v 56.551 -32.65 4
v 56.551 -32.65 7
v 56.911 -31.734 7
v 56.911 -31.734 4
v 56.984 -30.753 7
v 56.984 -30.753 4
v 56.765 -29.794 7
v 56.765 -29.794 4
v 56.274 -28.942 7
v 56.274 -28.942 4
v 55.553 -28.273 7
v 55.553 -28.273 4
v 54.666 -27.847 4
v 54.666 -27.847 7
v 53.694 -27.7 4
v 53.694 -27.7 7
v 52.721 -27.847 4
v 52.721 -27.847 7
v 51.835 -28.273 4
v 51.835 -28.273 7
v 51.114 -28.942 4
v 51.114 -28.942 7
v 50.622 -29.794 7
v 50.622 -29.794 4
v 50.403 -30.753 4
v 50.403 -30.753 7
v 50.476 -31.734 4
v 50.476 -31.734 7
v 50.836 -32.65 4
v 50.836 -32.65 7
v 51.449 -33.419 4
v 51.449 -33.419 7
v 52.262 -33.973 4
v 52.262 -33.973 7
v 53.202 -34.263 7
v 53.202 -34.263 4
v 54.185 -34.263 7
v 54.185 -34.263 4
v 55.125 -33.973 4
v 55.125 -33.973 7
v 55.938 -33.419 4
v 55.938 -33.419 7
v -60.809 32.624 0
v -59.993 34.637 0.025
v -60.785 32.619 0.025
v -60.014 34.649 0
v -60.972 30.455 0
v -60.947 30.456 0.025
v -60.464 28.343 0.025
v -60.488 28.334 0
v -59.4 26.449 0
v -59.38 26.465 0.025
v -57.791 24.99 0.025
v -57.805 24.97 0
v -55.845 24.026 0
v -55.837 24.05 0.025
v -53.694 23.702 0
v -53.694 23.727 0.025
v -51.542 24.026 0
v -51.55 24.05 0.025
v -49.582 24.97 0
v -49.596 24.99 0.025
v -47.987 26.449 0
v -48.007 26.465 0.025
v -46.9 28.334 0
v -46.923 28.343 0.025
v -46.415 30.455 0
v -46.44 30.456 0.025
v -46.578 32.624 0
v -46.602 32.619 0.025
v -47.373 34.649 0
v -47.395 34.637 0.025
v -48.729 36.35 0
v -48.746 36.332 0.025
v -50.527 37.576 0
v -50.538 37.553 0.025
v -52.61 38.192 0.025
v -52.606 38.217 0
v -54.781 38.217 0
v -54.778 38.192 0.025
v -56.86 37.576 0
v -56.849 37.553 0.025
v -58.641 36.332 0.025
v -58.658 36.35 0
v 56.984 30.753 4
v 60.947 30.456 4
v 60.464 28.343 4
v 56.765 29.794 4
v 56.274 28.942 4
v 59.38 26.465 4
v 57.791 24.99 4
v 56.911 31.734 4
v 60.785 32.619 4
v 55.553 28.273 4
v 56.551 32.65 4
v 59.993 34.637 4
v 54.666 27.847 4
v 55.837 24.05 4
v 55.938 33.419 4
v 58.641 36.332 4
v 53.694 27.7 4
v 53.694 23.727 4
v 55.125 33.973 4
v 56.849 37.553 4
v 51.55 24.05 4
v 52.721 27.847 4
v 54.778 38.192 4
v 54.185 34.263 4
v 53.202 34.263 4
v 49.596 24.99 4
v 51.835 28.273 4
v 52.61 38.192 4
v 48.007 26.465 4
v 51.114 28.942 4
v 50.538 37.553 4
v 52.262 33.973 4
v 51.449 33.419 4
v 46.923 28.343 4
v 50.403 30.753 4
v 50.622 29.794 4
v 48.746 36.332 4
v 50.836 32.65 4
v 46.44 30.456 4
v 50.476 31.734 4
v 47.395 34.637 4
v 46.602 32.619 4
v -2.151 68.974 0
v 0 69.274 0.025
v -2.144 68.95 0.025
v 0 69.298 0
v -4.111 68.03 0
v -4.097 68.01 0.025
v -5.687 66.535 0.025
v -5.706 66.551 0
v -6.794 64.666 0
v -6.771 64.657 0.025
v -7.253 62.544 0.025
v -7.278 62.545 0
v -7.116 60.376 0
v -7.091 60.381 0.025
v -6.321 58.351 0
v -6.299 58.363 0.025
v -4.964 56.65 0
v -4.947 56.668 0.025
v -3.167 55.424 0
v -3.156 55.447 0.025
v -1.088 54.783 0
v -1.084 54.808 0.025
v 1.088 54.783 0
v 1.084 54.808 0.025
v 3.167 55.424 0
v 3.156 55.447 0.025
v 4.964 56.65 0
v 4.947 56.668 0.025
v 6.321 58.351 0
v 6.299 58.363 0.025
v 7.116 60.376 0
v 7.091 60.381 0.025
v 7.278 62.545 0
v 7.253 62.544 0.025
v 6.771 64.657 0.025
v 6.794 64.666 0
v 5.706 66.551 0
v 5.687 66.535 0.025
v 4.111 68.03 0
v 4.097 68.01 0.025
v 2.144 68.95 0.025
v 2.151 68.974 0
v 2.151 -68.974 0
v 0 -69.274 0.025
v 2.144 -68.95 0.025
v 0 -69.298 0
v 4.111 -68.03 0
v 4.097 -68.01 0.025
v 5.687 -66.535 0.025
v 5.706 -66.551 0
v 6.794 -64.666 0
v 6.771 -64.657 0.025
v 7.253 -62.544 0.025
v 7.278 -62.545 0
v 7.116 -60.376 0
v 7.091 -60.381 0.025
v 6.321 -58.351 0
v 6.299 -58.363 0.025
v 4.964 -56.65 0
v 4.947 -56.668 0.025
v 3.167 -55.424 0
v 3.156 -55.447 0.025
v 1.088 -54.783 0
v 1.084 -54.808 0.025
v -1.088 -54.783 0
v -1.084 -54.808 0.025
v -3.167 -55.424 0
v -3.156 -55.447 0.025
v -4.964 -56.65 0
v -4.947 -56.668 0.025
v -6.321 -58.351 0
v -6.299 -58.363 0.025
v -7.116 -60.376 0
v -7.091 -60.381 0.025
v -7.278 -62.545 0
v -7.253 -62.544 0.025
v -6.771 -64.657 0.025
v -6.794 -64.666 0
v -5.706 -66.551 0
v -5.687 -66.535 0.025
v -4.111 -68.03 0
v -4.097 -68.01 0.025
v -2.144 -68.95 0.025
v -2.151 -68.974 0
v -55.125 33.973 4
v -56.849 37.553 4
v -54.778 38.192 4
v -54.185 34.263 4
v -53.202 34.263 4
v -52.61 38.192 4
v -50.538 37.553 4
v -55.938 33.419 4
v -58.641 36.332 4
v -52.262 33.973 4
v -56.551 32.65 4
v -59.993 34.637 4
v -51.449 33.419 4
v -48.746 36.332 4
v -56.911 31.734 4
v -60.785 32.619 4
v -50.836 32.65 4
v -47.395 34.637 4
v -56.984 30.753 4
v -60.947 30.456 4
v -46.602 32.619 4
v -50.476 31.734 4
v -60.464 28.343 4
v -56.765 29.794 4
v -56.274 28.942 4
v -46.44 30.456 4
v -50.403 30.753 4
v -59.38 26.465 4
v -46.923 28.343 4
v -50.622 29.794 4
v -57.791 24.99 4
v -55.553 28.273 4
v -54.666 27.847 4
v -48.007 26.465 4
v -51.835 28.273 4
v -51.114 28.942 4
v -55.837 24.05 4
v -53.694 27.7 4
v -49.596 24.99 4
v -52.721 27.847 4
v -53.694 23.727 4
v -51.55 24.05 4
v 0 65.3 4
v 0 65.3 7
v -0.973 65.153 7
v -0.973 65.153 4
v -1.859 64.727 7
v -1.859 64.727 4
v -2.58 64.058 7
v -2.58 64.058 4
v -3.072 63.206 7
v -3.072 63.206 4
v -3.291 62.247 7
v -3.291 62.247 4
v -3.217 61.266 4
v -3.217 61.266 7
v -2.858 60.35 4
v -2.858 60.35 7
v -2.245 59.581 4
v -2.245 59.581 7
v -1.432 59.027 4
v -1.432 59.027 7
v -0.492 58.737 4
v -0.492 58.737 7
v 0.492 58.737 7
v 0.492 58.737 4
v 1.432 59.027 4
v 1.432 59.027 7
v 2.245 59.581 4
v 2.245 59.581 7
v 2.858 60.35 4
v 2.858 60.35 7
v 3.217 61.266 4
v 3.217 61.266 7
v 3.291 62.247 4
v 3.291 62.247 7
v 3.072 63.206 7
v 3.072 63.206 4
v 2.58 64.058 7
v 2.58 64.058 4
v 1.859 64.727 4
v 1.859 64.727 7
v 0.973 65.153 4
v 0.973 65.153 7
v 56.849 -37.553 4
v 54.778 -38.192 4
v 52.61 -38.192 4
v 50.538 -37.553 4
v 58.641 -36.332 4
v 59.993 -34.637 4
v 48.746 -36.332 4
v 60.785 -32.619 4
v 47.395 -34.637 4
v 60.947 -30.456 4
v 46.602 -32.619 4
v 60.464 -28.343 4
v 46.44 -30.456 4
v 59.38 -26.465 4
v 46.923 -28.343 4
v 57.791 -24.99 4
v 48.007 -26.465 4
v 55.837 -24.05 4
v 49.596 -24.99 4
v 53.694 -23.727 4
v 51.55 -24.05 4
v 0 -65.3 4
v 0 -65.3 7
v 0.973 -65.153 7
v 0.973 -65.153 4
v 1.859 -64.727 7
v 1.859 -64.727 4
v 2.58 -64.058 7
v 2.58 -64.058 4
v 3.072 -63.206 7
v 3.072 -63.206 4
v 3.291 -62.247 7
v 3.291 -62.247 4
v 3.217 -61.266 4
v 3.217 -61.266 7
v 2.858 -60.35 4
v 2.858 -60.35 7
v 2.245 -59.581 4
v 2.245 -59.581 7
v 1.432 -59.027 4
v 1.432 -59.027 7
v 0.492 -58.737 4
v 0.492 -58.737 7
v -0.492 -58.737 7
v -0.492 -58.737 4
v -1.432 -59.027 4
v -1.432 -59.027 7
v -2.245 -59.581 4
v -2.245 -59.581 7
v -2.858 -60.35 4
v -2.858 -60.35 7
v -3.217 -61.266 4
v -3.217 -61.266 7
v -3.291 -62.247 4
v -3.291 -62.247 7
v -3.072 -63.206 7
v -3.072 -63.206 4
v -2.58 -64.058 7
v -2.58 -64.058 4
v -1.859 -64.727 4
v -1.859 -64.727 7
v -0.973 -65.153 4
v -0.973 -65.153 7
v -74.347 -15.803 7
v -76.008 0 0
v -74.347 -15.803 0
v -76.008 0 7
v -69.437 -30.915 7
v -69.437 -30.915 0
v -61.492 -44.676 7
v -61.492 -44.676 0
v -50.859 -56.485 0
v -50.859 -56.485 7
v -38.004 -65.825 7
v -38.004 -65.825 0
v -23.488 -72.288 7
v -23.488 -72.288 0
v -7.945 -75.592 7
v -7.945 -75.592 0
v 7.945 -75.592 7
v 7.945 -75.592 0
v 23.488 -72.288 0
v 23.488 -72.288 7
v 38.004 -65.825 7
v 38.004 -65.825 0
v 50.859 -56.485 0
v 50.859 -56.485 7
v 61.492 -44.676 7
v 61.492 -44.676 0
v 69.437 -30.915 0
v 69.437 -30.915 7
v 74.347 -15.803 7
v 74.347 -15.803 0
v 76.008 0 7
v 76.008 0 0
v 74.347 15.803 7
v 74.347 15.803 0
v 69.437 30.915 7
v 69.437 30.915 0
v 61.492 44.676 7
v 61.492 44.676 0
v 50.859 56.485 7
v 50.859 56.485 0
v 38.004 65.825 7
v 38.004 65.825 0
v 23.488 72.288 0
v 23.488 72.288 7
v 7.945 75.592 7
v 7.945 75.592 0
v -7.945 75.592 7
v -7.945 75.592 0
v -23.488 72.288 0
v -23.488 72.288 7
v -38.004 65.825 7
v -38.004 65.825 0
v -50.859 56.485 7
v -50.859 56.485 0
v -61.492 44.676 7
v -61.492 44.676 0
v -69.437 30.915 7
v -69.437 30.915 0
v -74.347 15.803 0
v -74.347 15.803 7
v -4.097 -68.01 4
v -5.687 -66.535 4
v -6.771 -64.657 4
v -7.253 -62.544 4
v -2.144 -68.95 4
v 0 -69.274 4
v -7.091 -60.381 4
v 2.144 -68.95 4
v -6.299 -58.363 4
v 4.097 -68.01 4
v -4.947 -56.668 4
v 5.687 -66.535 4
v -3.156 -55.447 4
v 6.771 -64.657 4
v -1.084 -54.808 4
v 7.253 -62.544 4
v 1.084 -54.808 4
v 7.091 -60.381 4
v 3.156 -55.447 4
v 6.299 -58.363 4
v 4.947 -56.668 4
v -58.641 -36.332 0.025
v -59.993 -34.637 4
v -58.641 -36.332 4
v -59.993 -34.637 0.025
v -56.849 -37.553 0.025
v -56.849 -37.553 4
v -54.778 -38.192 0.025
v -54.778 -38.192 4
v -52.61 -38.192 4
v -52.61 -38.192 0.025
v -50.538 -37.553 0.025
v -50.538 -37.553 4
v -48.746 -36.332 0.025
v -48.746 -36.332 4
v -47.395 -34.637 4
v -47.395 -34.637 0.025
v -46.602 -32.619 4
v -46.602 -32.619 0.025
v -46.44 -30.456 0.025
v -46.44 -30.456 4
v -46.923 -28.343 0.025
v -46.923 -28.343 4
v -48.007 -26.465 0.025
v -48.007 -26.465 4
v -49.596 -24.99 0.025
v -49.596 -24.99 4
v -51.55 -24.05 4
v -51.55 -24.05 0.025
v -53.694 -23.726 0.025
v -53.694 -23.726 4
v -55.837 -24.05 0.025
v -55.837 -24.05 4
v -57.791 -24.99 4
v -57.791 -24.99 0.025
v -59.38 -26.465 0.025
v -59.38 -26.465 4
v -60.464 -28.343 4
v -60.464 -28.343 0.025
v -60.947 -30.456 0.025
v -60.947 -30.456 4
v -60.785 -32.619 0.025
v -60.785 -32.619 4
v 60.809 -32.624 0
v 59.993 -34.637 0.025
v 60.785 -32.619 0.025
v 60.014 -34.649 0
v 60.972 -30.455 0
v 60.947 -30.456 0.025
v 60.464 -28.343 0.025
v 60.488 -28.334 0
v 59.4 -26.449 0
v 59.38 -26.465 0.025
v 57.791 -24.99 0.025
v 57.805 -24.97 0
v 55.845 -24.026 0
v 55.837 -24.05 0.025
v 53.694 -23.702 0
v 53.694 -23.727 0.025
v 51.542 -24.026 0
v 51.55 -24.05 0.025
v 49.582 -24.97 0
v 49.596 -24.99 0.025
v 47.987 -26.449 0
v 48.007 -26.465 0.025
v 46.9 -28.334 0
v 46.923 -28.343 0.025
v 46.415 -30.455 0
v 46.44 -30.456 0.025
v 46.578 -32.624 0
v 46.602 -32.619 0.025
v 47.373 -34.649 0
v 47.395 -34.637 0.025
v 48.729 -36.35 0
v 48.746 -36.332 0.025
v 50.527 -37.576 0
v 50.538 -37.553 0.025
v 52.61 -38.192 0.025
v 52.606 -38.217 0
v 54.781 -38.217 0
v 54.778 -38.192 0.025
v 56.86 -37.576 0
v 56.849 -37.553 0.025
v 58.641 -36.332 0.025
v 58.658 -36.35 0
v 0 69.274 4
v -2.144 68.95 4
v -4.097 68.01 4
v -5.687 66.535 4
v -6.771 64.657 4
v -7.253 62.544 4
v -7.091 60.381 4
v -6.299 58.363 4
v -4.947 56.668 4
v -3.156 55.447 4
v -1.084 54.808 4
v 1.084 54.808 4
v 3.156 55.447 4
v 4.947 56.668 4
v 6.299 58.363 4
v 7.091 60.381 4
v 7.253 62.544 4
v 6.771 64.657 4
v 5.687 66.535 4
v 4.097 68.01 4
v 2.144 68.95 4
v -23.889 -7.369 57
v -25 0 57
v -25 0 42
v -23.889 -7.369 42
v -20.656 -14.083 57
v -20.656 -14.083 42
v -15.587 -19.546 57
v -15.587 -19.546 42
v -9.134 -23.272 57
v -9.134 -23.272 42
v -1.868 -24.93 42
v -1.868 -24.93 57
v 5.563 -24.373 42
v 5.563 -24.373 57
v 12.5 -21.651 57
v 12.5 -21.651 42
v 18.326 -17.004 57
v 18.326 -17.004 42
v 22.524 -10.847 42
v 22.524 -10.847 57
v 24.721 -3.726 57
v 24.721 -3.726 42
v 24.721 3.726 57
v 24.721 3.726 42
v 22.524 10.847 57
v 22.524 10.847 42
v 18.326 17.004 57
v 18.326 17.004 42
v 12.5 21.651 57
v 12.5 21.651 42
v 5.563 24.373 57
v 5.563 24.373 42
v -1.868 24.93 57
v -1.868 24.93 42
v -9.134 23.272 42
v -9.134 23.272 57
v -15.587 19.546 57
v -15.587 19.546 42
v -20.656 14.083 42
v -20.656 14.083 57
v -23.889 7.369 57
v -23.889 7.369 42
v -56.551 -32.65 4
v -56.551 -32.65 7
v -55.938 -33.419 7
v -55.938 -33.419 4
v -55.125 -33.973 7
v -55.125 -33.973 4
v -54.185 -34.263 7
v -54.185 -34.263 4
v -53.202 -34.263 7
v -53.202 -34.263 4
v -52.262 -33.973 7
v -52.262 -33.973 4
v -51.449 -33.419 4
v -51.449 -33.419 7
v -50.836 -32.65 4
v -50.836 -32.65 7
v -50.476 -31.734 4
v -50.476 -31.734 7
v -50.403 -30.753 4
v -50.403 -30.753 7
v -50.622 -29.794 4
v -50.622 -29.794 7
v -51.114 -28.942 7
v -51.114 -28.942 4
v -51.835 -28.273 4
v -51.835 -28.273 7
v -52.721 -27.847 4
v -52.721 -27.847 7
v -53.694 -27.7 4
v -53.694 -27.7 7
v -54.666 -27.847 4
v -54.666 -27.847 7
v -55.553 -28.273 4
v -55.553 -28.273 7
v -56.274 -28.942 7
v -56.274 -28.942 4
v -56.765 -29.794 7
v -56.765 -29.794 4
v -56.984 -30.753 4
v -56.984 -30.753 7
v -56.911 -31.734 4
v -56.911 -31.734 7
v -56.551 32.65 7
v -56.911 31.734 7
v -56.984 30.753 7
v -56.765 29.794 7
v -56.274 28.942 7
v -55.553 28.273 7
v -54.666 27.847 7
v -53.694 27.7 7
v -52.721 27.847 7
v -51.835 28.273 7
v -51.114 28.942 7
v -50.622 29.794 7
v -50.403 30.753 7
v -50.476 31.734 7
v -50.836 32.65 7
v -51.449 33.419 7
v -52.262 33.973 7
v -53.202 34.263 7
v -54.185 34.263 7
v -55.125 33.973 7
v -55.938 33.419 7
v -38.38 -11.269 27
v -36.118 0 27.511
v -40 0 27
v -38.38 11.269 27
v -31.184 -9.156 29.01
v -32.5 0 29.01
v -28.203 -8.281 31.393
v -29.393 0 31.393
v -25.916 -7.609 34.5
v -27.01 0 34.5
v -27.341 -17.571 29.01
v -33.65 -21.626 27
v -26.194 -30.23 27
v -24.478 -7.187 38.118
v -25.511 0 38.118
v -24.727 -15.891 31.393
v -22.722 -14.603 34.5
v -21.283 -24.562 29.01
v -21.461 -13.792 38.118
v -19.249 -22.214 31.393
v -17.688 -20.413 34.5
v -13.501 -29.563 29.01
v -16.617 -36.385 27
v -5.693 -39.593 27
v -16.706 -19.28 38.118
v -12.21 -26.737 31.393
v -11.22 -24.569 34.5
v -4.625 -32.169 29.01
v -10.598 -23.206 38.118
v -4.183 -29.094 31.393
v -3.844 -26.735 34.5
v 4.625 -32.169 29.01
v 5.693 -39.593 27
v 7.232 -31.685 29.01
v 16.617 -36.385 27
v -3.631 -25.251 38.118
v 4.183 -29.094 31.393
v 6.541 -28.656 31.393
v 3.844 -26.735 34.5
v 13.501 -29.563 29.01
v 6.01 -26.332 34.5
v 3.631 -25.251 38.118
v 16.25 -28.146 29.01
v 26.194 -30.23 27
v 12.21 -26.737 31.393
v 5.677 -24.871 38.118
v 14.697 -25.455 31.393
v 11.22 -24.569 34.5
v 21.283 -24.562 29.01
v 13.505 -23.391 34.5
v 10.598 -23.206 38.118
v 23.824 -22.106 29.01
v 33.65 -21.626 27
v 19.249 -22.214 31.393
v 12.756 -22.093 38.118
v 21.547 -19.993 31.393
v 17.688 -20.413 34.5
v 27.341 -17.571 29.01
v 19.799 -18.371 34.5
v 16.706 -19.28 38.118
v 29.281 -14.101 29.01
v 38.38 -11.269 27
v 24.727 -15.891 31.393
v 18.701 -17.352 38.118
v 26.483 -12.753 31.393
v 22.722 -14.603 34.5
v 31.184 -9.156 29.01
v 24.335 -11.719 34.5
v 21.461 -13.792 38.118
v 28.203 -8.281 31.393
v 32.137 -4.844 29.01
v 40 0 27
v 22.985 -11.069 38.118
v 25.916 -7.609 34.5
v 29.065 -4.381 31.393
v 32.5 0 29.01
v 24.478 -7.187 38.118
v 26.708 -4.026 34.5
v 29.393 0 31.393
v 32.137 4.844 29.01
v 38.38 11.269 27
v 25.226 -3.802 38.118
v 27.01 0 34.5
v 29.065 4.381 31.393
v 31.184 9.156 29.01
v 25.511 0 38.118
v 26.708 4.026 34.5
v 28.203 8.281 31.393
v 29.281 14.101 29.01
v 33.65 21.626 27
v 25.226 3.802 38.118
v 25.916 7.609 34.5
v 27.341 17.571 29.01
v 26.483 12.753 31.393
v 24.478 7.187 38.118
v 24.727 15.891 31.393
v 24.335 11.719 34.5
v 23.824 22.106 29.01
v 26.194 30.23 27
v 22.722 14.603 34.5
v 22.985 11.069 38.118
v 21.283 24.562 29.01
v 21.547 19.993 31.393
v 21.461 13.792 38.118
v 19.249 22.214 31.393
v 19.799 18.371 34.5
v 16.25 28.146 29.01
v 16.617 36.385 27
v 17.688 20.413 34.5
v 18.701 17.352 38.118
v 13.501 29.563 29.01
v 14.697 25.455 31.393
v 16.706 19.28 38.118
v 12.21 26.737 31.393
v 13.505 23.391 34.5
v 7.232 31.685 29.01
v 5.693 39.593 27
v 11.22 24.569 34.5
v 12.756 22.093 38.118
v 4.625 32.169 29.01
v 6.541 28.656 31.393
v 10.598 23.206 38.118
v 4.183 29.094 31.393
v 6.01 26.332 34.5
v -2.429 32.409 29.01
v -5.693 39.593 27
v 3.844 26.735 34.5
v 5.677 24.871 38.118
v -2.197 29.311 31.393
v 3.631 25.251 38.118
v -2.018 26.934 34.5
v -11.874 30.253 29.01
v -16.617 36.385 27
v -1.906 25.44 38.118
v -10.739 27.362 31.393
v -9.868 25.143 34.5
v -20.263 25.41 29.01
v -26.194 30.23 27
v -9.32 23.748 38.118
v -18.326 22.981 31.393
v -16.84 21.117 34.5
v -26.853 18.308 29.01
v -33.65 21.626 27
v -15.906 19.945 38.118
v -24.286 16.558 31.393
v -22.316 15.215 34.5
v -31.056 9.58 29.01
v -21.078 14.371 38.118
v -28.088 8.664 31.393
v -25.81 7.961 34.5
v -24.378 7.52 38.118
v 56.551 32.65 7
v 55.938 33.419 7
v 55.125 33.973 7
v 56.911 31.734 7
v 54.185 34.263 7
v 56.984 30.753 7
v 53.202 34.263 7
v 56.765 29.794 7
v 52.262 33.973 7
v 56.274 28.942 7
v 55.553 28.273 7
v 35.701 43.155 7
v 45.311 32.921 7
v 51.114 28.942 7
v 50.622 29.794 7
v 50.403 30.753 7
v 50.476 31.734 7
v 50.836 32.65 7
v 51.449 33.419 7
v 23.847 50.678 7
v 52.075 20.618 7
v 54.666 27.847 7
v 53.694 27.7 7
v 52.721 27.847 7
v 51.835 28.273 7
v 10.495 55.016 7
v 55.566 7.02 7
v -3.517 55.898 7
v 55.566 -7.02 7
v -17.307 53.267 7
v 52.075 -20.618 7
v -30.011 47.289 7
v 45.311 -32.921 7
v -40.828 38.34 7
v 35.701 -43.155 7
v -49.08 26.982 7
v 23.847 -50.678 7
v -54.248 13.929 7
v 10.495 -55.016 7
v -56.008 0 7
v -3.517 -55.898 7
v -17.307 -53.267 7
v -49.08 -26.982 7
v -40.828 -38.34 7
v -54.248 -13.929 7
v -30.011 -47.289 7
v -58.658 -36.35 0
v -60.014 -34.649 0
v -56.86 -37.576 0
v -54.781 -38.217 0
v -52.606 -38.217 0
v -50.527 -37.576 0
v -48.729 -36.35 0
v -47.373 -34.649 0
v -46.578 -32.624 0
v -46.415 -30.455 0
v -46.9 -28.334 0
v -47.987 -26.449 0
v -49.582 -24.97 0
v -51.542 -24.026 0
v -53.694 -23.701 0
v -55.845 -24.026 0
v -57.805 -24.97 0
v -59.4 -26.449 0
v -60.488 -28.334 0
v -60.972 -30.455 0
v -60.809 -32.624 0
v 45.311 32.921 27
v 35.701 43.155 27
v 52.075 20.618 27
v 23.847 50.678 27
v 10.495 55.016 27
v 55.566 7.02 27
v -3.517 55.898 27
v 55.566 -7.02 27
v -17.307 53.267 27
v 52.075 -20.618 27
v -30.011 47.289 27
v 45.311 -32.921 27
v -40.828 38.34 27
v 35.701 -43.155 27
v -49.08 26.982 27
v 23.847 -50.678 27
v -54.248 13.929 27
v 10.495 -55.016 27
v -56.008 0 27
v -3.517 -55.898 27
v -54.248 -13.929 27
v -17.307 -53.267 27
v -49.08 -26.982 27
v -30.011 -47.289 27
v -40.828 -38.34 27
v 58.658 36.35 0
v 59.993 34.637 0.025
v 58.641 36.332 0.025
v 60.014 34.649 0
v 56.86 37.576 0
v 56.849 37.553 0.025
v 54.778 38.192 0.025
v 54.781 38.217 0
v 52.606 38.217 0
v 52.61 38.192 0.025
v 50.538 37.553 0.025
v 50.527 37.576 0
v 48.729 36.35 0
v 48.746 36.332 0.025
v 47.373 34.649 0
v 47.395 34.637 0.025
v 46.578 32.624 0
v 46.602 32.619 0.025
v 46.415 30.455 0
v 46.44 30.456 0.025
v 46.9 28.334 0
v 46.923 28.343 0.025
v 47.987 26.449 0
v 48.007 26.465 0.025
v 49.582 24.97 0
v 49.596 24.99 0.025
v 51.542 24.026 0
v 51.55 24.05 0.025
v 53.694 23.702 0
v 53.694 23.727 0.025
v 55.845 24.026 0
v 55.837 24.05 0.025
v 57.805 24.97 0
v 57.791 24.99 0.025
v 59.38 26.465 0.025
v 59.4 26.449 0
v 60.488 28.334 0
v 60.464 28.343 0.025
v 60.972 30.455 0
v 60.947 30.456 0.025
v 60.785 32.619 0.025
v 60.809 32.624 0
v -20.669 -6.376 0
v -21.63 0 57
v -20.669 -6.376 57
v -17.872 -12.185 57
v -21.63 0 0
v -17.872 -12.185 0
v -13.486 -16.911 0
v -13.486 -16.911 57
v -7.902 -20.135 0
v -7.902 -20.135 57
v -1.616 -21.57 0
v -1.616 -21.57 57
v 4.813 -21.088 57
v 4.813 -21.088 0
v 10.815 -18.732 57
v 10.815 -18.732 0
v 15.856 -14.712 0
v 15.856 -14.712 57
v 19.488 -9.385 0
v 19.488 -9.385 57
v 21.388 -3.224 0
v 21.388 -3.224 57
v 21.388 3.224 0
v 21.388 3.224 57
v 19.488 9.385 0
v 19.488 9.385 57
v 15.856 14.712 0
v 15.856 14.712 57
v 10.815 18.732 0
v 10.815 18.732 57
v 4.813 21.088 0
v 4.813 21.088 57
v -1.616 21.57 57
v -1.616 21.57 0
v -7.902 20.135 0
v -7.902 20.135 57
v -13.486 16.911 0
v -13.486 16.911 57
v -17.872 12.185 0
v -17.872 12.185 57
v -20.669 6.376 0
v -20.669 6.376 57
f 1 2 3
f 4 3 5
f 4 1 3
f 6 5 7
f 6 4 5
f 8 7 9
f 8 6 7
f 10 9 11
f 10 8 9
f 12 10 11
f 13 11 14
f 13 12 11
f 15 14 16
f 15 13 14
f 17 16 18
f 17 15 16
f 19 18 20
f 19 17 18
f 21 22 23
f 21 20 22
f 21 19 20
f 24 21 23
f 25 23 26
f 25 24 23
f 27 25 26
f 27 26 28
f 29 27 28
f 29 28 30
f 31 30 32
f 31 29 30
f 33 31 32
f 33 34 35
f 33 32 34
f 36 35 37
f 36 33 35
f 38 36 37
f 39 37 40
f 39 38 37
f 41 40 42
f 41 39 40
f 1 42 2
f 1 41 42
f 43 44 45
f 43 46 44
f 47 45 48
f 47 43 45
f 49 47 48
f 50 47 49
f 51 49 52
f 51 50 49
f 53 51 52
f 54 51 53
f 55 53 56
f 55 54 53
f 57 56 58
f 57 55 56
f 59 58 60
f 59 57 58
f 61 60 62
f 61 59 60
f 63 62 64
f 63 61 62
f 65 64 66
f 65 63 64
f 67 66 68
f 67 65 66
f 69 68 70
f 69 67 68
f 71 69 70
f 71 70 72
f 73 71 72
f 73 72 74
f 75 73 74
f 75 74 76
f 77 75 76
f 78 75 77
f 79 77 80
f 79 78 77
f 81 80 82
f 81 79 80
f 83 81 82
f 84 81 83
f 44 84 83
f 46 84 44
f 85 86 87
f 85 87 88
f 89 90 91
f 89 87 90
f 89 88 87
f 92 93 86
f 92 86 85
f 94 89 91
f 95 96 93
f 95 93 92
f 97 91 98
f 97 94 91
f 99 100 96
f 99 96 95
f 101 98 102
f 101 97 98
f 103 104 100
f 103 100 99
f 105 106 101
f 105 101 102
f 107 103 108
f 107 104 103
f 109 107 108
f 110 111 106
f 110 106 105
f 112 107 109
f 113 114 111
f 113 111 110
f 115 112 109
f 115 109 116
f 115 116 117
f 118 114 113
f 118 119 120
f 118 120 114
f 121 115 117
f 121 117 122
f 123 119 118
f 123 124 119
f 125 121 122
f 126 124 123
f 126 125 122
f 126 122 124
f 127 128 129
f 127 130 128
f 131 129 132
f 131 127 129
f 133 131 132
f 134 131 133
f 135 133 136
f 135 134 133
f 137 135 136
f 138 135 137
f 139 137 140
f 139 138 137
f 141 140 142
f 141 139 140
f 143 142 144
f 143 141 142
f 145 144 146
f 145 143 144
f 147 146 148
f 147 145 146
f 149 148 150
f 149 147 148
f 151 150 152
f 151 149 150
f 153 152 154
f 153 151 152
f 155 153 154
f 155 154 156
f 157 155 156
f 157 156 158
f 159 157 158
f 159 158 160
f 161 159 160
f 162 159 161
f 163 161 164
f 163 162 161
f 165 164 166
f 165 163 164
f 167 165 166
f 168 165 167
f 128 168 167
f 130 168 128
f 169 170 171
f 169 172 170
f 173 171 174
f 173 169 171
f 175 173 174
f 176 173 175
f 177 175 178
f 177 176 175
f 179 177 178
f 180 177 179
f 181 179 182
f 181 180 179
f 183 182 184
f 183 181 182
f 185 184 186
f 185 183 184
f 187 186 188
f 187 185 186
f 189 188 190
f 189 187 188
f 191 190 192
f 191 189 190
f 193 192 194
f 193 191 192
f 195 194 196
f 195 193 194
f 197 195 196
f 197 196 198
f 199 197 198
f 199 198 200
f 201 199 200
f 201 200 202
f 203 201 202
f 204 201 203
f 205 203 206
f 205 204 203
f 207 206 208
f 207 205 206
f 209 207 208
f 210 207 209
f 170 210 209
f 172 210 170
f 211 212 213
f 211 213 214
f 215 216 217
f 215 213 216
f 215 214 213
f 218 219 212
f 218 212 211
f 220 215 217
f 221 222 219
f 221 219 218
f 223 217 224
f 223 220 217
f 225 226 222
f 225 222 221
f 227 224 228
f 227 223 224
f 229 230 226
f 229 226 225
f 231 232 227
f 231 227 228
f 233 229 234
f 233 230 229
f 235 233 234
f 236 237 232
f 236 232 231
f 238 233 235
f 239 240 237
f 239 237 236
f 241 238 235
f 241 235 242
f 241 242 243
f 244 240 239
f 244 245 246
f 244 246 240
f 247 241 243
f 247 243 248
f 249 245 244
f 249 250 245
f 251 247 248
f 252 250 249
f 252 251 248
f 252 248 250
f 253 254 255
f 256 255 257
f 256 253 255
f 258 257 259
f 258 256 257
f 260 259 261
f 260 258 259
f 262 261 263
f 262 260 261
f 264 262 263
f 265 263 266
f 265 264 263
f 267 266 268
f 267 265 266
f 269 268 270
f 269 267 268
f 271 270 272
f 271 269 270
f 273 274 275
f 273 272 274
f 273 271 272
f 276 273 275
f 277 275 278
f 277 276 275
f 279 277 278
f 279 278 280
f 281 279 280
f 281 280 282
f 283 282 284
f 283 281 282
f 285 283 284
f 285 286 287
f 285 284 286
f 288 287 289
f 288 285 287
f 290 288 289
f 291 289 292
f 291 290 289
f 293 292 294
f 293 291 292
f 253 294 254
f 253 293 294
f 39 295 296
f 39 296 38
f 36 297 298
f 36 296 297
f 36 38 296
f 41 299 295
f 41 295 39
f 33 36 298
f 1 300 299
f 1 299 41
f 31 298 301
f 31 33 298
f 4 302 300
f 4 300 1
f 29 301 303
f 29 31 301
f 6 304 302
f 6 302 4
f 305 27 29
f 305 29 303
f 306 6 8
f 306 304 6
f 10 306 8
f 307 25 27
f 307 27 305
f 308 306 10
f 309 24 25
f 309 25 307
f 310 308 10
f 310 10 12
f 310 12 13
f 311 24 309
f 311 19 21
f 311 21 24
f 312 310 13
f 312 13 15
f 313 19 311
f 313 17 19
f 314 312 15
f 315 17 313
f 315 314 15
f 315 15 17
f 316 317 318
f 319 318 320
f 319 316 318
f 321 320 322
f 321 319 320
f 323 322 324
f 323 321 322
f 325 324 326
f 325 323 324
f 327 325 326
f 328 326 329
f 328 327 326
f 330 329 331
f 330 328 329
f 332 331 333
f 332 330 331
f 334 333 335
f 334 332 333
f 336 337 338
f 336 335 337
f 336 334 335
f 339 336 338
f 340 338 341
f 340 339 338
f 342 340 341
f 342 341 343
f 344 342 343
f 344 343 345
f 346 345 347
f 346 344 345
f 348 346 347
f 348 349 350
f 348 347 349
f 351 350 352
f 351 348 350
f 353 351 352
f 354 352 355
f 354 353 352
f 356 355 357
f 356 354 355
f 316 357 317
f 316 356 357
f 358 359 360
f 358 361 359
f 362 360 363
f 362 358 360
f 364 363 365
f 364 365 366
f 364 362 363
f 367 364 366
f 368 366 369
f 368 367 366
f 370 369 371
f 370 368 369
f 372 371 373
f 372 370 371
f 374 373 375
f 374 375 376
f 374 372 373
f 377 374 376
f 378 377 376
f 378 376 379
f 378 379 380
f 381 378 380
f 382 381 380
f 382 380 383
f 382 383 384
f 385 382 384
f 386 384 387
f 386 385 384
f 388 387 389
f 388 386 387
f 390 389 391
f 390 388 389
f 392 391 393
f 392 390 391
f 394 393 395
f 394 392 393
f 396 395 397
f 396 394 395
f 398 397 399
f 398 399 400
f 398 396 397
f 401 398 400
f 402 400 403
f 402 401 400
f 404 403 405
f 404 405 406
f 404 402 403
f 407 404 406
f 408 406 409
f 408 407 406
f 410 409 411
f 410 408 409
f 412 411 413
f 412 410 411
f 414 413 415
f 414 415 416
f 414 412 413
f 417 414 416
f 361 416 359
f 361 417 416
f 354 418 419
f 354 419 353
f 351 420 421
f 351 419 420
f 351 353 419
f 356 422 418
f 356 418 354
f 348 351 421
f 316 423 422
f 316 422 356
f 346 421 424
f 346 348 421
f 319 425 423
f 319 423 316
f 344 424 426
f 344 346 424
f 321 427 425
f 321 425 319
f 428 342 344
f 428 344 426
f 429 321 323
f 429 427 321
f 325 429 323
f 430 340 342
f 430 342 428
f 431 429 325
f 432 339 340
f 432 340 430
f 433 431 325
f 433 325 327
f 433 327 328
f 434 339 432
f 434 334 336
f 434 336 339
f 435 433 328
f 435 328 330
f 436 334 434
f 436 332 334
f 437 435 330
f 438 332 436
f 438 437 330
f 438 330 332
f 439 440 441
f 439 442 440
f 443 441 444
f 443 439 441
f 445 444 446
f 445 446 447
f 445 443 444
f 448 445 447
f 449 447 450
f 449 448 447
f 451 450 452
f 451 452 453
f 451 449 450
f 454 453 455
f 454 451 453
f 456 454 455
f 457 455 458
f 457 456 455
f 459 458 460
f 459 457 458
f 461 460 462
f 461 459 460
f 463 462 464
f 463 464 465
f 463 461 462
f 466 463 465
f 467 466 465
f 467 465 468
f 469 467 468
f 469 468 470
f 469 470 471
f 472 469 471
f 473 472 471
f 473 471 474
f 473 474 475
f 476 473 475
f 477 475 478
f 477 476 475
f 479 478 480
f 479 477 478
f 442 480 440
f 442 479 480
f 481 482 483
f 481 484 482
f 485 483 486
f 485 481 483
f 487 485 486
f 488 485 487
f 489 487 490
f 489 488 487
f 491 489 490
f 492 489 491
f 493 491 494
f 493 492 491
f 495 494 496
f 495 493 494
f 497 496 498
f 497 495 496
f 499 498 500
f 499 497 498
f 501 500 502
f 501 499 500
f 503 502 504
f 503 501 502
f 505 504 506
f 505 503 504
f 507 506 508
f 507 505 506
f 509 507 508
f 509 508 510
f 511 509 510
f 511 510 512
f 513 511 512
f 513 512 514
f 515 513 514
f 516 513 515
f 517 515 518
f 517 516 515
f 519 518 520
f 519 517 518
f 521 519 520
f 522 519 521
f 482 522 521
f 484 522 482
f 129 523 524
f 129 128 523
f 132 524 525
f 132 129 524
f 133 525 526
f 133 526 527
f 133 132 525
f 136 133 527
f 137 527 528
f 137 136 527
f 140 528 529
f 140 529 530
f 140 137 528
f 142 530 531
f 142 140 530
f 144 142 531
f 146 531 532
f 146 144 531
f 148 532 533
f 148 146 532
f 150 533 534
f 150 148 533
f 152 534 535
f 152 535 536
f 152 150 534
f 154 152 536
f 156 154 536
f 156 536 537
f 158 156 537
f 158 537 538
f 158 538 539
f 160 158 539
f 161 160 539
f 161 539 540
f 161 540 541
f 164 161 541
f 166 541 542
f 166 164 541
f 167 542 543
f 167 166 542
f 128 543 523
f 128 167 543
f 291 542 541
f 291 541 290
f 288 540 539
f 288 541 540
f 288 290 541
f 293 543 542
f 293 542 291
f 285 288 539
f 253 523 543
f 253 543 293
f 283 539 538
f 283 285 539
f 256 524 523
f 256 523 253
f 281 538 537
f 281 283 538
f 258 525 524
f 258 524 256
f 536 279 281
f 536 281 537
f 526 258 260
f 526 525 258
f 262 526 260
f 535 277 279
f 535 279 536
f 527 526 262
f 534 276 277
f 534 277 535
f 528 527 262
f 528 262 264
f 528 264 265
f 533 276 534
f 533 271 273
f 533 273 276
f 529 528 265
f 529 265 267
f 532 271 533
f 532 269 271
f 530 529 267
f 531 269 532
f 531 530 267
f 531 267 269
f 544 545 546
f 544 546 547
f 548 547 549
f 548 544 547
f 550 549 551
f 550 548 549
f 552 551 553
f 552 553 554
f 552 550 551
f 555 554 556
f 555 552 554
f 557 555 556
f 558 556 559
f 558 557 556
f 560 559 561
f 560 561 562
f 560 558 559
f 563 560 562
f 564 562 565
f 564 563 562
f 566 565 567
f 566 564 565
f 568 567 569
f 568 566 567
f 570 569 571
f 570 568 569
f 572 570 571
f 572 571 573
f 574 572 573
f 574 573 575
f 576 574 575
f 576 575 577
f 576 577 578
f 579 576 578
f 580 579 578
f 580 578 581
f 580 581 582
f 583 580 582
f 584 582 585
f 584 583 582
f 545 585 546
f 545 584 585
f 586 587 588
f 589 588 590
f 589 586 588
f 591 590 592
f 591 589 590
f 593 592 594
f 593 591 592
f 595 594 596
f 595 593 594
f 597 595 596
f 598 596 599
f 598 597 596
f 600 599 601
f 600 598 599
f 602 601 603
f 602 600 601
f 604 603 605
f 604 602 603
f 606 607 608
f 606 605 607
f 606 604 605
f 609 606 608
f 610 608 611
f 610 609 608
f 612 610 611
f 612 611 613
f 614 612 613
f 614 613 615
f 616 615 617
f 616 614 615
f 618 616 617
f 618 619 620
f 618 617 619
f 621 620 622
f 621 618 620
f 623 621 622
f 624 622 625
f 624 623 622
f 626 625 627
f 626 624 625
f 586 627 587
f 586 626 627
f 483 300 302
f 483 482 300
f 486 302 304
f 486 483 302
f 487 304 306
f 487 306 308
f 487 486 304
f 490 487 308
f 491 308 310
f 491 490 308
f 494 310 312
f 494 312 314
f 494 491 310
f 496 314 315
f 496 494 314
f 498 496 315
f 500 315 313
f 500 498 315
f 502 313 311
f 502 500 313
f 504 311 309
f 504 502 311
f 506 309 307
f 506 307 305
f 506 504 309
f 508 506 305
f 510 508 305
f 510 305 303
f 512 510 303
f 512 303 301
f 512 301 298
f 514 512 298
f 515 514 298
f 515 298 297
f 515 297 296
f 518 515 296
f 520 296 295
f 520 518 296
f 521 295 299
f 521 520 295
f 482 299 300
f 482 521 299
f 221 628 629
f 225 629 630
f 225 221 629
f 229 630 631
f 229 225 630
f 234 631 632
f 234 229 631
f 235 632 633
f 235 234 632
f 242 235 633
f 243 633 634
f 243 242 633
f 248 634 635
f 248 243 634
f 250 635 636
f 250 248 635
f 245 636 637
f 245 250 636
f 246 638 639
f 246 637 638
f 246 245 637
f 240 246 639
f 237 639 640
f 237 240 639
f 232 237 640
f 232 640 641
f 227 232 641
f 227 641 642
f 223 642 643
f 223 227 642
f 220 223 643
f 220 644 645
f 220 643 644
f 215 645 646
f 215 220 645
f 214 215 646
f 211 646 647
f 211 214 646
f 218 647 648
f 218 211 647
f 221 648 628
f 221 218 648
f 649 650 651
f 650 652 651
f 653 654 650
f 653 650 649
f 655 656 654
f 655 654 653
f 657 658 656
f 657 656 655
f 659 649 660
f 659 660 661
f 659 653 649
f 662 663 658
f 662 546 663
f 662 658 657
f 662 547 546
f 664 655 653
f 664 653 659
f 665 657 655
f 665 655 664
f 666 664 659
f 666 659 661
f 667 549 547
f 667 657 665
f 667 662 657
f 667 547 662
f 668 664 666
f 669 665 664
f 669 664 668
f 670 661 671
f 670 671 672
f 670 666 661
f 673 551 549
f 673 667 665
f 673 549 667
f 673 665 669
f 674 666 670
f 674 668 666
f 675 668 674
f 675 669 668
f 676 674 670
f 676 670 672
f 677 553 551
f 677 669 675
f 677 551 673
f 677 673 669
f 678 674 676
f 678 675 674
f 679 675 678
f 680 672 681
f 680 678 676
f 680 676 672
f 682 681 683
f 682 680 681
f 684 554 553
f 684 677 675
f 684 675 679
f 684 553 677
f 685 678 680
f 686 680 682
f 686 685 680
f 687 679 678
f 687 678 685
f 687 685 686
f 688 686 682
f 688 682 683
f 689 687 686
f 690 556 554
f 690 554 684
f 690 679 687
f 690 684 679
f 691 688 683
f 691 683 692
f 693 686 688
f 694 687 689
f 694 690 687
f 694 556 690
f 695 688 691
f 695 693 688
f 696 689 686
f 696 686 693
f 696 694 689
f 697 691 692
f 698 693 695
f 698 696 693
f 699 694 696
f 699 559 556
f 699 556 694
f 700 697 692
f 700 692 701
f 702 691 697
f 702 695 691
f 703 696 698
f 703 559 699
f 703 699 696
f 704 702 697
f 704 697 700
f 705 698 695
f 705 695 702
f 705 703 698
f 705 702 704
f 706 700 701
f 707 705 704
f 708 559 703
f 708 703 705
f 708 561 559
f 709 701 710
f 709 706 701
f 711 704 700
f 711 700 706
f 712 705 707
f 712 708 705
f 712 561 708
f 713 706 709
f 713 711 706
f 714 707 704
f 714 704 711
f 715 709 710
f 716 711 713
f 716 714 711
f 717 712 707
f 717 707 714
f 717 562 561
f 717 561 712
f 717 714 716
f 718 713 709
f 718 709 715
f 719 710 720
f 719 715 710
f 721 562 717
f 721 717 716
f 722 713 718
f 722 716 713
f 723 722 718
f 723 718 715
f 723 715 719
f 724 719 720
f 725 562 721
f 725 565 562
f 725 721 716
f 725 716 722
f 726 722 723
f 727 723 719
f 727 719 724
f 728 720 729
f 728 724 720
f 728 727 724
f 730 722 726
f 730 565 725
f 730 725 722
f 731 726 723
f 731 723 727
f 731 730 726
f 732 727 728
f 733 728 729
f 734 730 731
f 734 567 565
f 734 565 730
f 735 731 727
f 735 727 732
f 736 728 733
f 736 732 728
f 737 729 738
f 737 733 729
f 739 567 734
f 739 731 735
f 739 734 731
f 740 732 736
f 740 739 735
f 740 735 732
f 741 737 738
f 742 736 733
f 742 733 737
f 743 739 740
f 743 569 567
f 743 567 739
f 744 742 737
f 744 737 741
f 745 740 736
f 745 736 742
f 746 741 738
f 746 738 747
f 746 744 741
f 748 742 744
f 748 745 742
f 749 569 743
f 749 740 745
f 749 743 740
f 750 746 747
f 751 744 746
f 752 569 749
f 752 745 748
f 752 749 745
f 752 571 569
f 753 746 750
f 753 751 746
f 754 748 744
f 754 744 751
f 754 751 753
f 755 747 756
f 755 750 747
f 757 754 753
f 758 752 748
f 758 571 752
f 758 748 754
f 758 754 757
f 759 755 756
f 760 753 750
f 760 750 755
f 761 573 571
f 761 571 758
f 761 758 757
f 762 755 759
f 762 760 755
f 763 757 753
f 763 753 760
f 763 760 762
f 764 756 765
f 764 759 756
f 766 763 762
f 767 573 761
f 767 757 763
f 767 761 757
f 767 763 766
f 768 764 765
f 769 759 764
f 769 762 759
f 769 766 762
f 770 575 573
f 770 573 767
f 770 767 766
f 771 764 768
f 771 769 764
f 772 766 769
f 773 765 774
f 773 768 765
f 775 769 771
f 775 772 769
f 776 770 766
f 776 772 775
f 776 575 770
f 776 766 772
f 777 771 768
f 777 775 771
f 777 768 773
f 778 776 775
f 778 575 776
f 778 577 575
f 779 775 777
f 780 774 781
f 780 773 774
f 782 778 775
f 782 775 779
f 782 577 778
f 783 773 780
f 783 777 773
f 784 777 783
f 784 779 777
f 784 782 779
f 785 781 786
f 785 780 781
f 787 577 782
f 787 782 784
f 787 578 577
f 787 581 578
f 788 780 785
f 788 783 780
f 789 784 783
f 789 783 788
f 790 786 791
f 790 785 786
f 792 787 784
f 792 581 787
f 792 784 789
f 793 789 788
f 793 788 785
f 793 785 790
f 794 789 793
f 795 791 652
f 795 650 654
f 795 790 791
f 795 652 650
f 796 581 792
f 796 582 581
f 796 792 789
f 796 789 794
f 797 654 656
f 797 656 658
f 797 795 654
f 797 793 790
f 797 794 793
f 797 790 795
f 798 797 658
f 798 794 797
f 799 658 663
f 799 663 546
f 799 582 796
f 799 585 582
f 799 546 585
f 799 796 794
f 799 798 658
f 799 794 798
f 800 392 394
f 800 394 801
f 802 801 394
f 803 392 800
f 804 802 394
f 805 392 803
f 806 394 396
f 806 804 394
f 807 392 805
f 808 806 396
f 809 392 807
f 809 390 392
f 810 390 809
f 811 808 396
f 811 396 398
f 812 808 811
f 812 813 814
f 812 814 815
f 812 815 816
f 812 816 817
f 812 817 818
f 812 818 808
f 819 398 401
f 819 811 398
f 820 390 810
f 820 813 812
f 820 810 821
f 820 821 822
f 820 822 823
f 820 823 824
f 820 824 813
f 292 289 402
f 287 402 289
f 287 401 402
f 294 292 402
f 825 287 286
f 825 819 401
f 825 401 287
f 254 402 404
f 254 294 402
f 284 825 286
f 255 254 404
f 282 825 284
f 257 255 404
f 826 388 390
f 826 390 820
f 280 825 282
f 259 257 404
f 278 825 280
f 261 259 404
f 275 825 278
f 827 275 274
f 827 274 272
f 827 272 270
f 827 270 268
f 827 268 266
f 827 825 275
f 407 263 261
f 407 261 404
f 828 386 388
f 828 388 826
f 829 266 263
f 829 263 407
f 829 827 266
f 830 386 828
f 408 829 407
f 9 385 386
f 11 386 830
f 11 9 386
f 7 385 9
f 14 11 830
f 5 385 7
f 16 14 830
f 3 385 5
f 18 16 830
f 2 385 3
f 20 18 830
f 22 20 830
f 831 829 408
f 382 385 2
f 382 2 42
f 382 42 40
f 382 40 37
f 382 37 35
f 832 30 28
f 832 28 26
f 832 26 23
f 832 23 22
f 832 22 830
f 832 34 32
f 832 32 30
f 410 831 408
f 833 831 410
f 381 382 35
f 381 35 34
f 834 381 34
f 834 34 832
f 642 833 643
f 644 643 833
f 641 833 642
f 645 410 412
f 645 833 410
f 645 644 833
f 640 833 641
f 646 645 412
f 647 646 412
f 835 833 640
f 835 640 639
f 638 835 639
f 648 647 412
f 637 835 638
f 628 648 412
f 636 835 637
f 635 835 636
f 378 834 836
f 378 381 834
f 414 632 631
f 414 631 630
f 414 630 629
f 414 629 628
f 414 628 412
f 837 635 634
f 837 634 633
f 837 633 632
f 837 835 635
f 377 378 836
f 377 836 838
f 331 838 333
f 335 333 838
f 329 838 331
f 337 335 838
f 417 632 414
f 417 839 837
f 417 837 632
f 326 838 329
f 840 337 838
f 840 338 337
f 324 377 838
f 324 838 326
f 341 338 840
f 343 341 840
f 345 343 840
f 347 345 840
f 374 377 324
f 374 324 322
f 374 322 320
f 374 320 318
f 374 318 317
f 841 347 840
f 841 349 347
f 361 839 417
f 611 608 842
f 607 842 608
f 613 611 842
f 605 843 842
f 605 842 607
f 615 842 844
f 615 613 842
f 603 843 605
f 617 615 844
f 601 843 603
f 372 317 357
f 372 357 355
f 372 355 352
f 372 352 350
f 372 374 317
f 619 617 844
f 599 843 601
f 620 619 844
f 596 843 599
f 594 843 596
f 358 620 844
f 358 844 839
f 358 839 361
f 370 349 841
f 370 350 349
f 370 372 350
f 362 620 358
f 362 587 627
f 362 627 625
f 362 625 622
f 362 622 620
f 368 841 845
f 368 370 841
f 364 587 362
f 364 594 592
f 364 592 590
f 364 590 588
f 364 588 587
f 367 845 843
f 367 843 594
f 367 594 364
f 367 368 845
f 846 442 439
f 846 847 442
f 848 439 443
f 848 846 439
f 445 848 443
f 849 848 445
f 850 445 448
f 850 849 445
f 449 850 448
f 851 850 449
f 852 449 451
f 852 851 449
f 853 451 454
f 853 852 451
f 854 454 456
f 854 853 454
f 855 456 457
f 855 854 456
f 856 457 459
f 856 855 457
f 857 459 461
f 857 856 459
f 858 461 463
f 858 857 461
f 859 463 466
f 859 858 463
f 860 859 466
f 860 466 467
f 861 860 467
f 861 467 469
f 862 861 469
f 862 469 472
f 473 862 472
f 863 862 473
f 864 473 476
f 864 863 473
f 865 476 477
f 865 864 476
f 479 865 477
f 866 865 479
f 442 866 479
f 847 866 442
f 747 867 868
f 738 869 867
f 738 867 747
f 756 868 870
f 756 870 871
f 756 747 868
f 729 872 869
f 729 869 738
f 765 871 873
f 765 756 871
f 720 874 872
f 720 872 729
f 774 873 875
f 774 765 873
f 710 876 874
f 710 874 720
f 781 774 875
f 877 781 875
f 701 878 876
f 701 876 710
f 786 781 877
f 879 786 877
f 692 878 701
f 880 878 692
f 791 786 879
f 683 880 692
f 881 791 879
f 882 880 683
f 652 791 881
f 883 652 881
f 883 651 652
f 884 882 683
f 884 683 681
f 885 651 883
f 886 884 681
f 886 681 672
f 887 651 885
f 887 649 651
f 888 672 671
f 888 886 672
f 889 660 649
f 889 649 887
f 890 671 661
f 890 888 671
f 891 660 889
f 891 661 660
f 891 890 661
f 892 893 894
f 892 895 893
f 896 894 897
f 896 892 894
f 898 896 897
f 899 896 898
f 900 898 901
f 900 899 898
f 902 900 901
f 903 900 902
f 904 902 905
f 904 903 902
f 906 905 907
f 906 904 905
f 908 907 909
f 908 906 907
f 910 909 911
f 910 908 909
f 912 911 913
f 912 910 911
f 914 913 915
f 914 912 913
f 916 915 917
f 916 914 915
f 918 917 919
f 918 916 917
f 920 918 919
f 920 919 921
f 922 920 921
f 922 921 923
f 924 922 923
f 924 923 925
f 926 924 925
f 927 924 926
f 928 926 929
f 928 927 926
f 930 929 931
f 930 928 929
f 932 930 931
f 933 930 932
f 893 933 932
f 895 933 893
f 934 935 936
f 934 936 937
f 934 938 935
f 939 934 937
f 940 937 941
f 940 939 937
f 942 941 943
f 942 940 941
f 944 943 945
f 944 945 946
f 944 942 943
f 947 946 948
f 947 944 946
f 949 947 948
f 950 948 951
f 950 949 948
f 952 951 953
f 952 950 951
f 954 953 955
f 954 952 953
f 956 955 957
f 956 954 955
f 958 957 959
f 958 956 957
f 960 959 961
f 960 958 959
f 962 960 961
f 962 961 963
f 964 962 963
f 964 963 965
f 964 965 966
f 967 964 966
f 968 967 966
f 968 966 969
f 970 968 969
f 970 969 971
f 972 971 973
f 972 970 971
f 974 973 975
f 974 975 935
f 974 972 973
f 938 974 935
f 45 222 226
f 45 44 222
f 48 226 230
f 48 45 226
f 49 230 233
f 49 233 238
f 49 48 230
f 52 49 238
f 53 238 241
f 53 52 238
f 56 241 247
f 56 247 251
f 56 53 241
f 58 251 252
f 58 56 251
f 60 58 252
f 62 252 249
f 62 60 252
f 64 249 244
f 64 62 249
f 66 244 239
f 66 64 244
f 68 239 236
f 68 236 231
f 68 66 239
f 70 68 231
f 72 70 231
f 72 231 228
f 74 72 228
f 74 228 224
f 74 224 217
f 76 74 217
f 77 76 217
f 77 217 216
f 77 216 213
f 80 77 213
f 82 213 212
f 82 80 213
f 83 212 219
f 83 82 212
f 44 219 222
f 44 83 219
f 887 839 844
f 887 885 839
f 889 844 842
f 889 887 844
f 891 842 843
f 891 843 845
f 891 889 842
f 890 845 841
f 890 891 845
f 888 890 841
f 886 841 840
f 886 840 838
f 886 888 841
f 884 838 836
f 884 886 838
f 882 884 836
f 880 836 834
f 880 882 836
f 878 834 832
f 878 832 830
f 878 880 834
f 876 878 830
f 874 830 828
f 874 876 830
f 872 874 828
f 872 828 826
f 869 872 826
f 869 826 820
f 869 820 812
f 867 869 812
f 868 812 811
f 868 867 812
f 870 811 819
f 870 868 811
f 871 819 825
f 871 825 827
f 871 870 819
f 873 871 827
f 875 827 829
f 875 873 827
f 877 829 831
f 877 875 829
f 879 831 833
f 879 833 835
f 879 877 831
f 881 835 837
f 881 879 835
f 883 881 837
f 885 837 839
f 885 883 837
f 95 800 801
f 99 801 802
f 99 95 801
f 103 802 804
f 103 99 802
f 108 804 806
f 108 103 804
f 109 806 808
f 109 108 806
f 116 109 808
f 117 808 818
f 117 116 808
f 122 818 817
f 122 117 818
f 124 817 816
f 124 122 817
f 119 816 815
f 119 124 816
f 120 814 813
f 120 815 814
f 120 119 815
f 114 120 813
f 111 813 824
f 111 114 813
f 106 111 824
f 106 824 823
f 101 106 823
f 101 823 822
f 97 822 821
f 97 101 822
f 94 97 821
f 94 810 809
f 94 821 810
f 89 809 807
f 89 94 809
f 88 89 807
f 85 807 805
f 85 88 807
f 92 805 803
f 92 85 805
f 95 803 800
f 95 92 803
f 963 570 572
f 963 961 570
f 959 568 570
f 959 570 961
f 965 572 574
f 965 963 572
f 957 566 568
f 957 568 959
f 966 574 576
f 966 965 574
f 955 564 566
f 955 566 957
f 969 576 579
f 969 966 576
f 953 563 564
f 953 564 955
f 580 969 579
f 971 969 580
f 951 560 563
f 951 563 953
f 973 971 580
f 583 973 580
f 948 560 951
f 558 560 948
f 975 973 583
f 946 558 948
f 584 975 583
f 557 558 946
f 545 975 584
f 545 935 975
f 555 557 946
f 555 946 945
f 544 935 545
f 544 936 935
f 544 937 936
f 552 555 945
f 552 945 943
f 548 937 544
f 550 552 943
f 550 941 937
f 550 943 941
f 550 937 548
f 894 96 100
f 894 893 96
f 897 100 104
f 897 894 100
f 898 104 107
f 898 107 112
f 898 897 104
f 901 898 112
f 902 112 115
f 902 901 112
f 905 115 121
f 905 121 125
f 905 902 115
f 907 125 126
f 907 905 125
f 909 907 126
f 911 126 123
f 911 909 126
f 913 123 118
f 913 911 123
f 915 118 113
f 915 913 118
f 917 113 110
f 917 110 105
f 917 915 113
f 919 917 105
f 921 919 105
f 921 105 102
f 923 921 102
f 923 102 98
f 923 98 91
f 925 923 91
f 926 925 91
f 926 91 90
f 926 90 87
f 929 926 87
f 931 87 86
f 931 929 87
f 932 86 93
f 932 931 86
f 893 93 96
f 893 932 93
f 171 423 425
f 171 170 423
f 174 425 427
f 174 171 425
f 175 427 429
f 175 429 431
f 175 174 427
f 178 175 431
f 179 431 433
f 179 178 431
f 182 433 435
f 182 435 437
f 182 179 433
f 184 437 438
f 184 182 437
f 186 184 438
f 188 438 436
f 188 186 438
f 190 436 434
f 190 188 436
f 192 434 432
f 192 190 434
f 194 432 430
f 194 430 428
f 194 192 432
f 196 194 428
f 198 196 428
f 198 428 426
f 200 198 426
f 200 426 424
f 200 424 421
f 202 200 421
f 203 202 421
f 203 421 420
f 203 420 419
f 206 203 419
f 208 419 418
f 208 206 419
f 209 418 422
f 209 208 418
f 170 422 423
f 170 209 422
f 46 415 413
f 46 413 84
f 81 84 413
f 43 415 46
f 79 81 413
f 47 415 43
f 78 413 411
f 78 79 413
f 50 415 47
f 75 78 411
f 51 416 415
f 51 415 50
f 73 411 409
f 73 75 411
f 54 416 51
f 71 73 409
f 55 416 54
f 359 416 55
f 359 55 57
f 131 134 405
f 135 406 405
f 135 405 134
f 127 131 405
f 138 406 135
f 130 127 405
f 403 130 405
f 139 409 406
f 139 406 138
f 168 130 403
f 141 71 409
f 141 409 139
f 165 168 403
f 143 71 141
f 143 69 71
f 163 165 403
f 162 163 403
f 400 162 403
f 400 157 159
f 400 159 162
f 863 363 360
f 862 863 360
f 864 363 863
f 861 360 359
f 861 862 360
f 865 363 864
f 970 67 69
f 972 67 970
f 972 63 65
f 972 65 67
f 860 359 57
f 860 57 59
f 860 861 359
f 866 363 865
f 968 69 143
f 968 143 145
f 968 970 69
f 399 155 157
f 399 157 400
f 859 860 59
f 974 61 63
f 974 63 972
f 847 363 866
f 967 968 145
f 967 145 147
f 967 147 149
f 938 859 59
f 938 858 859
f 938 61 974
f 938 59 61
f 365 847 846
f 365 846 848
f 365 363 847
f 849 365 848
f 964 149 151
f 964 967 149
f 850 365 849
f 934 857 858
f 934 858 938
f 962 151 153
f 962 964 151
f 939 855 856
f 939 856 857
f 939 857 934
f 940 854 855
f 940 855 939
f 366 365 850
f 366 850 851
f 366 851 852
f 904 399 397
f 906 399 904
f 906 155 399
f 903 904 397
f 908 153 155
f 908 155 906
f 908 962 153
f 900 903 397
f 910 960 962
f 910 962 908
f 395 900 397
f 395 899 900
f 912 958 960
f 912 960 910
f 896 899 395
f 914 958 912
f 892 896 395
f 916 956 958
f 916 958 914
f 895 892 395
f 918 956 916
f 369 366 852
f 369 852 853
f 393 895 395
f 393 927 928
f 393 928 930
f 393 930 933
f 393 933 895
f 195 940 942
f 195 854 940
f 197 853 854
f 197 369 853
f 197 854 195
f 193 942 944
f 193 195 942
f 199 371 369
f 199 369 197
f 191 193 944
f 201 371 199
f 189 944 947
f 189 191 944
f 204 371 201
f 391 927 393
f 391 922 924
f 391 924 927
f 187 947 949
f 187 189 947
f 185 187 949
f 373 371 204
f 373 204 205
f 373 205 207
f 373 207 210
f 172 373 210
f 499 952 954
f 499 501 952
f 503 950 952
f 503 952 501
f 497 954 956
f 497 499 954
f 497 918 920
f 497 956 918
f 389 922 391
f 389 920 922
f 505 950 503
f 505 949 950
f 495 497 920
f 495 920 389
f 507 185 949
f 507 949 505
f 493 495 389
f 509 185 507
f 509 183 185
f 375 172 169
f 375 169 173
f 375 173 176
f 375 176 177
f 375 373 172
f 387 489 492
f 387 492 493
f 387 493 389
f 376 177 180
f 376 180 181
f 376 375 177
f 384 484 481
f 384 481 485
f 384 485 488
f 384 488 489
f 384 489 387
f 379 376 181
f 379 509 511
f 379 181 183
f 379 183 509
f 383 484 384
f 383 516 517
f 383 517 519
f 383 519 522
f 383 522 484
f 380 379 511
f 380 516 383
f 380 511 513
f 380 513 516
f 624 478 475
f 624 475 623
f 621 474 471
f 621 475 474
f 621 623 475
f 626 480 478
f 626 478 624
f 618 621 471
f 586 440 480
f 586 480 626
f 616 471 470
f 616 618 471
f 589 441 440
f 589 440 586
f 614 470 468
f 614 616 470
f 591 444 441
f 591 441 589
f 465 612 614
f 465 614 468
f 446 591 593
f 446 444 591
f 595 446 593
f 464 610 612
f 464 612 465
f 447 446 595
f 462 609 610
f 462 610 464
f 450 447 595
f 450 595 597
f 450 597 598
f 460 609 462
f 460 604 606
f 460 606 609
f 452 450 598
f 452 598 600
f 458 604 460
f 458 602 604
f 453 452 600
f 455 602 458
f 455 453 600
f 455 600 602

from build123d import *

# Parameters (mm, degrees)
FILLET1_R         = 15
CIRPATTERN1_COUNT = 6


with BuildPart() as part:
    # Sketch1 → Revolve1 (revolve)
    with BuildSketch(Plane(origin=(0, 0, 0), x_dir=(1, 0, 0), z_dir=(0, 1, 0))):
        Polygon((-76.008064516, 0), (-76.008064516, -7), (-56.008064516, -7), (-56.008064516, -27), (-25, -27), (-25, -57), (-21.63, -57), (-21.63, 0), align=None)
    revolve(axis=Axis((0, 0, 0), (0, 0, 1)))

    # Fillet1
    fillet1_edges = [part.edges().sort_by_distance(p)[0] for p in [
        (25, 0, 27),
    ]]
    fillet(fillet1_edges, radius=FILLET1_R)

    # Sketch3 → CBORE for M6 Hex Head Bolt1 (revolve, cut)
    with BuildSketch(Plane(origin=(0, 62, 0), x_dir=(0, 1, 0), z_dir=(1, 0, 0))):
        Polygon((0, 0), (0, 57), (3.3, 57), (3.3, 4), (7.2735, 4), (7.2735, 0.025), (7.2985, 0), align=None)
    cbore_for_m6_hex_head_bolt1 = revolve(axis=Axis((0, 62, -6.35), (0, 0, 1)), mode=Mode.SUBTRACT)

    # CirPattern1: CBORE for M6 Hex Head Bolt1 ×6 about axis
    cirpattern1_axis = Axis((0, 0, 0), (0, 0, 1))
    for i in range(1, CIRPATTERN1_COUNT):
        add(cbore_for_m6_hex_head_bolt1.rotate(cirpattern1_axis, i * 360 / CIRPATTERN1_COUNT), mode=Mode.SUBTRACT)


solid = part.part
